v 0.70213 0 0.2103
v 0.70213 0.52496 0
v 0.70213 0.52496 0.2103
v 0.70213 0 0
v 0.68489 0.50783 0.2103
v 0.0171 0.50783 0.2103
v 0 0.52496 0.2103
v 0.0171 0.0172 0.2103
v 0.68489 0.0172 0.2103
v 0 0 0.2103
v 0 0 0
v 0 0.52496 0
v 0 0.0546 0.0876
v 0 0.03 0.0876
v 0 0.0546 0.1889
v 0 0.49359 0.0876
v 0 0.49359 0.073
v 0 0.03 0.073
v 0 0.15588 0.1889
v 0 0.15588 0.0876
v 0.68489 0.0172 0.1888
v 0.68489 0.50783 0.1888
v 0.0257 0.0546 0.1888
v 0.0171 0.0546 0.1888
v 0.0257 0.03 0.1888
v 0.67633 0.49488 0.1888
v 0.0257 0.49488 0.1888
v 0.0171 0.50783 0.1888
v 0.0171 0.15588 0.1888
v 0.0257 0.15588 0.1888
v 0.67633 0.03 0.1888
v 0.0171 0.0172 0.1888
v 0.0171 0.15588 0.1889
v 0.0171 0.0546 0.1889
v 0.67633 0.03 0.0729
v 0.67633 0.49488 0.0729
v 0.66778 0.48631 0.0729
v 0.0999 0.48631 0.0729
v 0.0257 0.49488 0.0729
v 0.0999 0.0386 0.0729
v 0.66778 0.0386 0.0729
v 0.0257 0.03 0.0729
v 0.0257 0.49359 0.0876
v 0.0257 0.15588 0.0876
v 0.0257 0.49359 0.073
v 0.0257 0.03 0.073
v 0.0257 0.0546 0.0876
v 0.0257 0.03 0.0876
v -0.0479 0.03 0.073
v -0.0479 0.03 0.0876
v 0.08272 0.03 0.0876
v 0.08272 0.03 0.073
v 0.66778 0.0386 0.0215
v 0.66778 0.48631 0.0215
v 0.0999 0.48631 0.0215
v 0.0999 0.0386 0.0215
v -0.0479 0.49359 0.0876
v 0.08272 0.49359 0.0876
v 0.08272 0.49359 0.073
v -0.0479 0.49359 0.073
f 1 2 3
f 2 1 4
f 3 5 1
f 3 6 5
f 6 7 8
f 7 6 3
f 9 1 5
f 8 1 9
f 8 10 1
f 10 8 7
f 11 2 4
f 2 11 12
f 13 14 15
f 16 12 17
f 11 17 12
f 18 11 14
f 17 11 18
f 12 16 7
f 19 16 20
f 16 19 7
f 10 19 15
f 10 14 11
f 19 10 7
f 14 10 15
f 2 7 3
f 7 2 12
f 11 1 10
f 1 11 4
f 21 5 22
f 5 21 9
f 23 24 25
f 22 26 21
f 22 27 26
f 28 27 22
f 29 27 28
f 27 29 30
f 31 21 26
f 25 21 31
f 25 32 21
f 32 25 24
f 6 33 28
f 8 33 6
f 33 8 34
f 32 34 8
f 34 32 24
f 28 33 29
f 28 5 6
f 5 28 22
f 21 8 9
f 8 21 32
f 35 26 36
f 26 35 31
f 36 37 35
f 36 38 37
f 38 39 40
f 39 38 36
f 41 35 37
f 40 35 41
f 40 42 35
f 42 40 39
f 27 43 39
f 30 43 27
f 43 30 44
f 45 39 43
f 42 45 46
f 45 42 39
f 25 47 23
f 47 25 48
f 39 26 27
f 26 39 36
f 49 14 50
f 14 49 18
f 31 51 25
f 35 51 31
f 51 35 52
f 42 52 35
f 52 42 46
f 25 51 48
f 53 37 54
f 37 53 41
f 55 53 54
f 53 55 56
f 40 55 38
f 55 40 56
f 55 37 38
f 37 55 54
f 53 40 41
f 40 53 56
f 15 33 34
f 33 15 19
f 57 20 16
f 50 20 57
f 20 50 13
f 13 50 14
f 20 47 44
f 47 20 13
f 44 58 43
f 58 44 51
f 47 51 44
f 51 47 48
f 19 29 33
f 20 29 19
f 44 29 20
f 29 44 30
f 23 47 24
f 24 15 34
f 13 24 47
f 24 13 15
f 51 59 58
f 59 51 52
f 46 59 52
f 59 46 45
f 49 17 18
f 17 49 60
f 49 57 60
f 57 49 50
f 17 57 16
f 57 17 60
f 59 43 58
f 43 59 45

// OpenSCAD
// Main body dimensions
length = 0.702127;
width = 0.524964;
height = 0.2103;
$fn = 50;

// Main body
module main_body() {
    cube([length, width, height]);
}

// Shallow top recess (first level)
module top_recess() {
    // Dimensions
    recess_length = 0.667793;
    recess_width = 0.490631;
    recess_depth = 0.0215;
    
    // Position calculations
    left_inset = 0.0171;
    right_inset = 0.0172;
    front_inset = 0.0172;
    back_inset = 0.0172;
    
    // Vertical position (bottom of recess)
    z_start = 0.1888;
    
    translate([left_inset, front_inset, z_start])
        cube([recess_length, recess_width, recess_depth]);
}

// Second level recess
module second_recess() {
    // Dimensions
    recess_length = 0.650626;
    recess_width = 0.46488;
    recess_depth = 0.1159;
    
    // Position calculations
    left_inset = 0.0257;
    right_inset = 0.0258;
    front_inset = 0.03;
    back_inset = 0.0301;
    
    // Vertical position (bottom of recess)
    z_start = 0.0729;
    
    translate([left_inset, front_inset, z_start])
        cube([recess_length, recess_width, recess_depth]);
}

// Lower pocket (third level)
module lower_pocket() {
    // Dimensions
    pocket_length = 0.567882;
    pocket_width = 0.447713;
    pocket_depth = 0.0515;
    
    // Position calculations
    left_inset = 0.0999;
    right_inset = 0.0343;
    front_inset = 0.0386;
    back_inset = 0.0387;
    
    // Vertical position (bottom of pocket)
    z_start = 0.0215;
    
    translate([left_inset, front_inset, z_start])
        cube([pocket_length, pocket_width, pocket_depth]);
}

// Side projection (solid addition)
module side_projection() {
    // Dimensions
    proj_length = 0.130618;
    proj_width = 0.463588;
    proj_thickness = 0.0146;
    
    // Position calculations
    overhang = 0.0479;
    right_space = 0.6194;
    front_inset = 0.03;
    back_inset = 0.0314;
    
    // Vertical position (bottom of projection)
    z_start = 0.073;
    z_end = 0.0876;
    proj_height = z_end - z_start;
    
    // X position (overhanging left edge)
    x_pos = -overhang;
    
    // Y position
    y_pos = front_inset;
    
    translate([x_pos, y_pos, z_start])
        cube([proj_length, proj_width, proj_height]);
}

// Side recess (cutout)
module side_recess() {
    // Dimensions
    recess_depth = 0.0343;
    recess_length = 0.367372;  // Length in z-direction
    recess_width = 0.101285;   // Width in y-direction
    
    // Position calculations
    right_space = 0.6678;
    front_inset = 0.0546;
    back_inset = 0.103;
    
    // Vertical position (bottom of recess)
    z_start = 0.0876;
    z_end = 0.1889;
    recess_height = z_end - z_start;
    
    // X position (at left edge)
    x_pos = 0;
    
    // Y position
    y_pos = front_inset;
    
    translate([x_pos, y_pos, z_start])
        cube([recess_depth, recess_width, recess_height]);
}

// Main assembly
difference() {
    // Start with main body
    main_body();
    
    // Subtract all recesses
    top_recess();
    second_recess();
    lower_pocket();
    side_recess();
}

// Add side projection
side_projection();
